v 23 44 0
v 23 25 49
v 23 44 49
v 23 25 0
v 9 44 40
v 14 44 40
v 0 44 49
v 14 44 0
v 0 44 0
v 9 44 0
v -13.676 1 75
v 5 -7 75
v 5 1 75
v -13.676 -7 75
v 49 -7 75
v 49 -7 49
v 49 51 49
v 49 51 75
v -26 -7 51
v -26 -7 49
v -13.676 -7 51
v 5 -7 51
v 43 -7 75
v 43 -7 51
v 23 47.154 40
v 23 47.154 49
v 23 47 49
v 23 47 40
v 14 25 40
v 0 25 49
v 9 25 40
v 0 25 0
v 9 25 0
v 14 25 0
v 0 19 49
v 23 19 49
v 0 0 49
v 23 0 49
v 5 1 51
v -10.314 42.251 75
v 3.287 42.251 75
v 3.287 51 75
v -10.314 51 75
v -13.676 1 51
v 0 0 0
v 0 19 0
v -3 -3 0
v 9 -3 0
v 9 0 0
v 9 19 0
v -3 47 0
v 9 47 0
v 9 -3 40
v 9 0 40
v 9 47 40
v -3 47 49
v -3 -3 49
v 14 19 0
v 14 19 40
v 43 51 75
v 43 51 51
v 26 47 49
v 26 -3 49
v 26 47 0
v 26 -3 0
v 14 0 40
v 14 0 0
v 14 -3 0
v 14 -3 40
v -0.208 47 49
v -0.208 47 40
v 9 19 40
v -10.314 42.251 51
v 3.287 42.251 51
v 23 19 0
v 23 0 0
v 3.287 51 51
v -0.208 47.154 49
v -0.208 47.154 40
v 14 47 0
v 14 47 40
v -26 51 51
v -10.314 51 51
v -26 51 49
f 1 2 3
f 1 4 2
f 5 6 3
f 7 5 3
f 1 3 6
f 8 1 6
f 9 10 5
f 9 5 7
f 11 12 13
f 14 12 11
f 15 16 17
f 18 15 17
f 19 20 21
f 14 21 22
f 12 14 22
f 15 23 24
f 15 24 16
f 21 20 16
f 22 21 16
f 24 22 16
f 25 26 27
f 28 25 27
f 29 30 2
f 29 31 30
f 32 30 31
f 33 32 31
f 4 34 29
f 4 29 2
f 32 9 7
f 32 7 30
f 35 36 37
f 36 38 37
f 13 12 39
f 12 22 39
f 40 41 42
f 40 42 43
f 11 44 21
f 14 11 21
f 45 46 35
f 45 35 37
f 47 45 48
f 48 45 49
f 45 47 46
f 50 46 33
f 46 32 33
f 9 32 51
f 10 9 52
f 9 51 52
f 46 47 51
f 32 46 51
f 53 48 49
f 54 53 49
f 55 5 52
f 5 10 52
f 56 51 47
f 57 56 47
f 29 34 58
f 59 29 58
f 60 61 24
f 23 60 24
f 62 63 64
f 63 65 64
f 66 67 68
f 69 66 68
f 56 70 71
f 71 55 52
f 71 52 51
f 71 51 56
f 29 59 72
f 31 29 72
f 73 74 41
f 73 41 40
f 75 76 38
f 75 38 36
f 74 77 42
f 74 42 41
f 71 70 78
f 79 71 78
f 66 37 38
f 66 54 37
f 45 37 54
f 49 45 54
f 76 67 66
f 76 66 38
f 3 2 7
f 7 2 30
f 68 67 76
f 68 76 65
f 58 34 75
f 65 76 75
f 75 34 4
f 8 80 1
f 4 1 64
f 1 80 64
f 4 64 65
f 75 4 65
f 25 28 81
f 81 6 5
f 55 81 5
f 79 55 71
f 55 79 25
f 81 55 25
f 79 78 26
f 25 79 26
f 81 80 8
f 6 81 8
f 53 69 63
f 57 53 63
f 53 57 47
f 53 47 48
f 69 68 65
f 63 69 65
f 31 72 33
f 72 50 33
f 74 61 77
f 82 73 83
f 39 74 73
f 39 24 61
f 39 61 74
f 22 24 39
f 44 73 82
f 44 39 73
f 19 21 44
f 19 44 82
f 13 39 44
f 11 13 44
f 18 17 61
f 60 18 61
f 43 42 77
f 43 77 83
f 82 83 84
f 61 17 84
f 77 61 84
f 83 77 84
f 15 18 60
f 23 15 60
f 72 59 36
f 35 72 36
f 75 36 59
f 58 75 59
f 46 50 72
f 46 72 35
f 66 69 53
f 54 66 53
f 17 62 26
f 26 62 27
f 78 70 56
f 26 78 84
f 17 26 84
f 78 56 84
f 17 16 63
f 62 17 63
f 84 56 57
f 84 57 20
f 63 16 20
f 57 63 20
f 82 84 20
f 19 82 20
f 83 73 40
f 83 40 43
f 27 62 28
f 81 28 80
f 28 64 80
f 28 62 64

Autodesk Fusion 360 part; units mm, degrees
sketch "Sketch1" plane through (0, 0, 0) normal (0, 0, 1) x (1, 0, 0)
  line L0 (0, 0) -> (23, 0)
  line L1 (23, 0) -> (23, 19)
  line L2 (23, 19) -> (0, 19)
  line L3 (0, 19) -> (0, 0)
  line L4 (0, 0) -> (23, 19) construction
  line L5 (14, -5.5) -> (9, -5.5) construction
  line L6 (9, -5.5) -> (9, 24.5)
  line L7 (9, 24.5) -> (14, 24.5) construction
  line L8 (14, 24.5) -> (14, -5.5)
  line L9 (14, -5.5) -> (9, 24.5) construction
  line L10 (9, -5.5) -> (14, 24.5) construction
  line L11 (-3, 22) -> (-3, -3)
  line L12 (-3, -3) -> (26, -3)
  line L13 (26, -3) -> (26, 22)
  line L14 (26, 22) -> (-3, 22)
  point P0 (11.5, 9.5)
  dimension "d1" = 23
  dimension "d2" = 19
  dimension "d5" = 5
  dimension "d6" = 3
  dimension "d11" = 30
extrude "Extrude4" add sketch "Sketch1" along normal blind 50 contours L0 L2 L3 L6 L11 L12 L14 | L0 L1 L2 L8 L12 L13 L14 makes body 1 at (-3, 13.6667, 16.6667) makes body 2 at (26, 5.3333, 16.6667)
sketch "Sketch2" plane through (0, 0, 50) normal (0, 0, 1) x (-1, 0, 0)
  line L0 (-14, 0) -> (-14, 3)
  line L1 (-14, 3) -> (-26, 3)
  line L2 (-26, 3) -> (-26, -22)
  line L3 (-26, -22) -> (-14, -22)
  line L4 (-14, -22) -> (-14, -19)
  line L5 (-14, -19) -> (-23, -19)
  line L6 (-23, -19) -> (-23, 0)
  line L7 (-23, 0) -> (-14, 0)
  line L8 (0.208, -22.1542) -> (-23, -22.1542)
  line L9 (-23, -22.1542) -> (-23, -19)
  line L10 (-23, -19) -> (0.208, -19)
  line L11 (0.208, -19) -> (0.208, -22.1542)
  line L12 (0, 0) -> (-23, 0)
  line L13 (-23, 0) -> (-23, 3)
  line L14 (-23, 3) -> (0, 3)
  line L15 (0, 3) -> (0, 0)
extrude "Extrude5" add sketch "Sketch2" against normal blind 10 contours L0 L1 L7 L12 L13 L14 | L0 L12 L14 L15 | L3 L4 L5 L9 L10 | L3 L4 L8 L9 L10 L11 bodies 1 2
copy_body "CopyPasteBodies1" bodies 1 makes body 3
move_body "Move1" bodies 3 to x (1, 0, 0) y (0, 1, 0) z (0, 0, 1) at (0, 30, 0)
move_body "Move2" bodies 3 to x (1, 0, 0) y (0, 1, 0) z (0, 0, 1) at (0, -5, 0)
sketch "Sketch3" plane through (0, 0, 50) normal (0, 0, 1) x (-1, 0, 0)
  line L0 (0, -44) -> (-23, -44)
  line L1 (-23, -44) -> (-23, -25)
  line L2 (-23, -25) -> (0, -25)
  line L3 (0, -25) -> (0, -44)
  line L4 (-23, -47) -> (-23, -47.1542)
  line L5 (-23, -47.1542) -> (0.208, -47.1542)
  line L6 (0.208, -47.1542) -> (0.208, -47)
  line L7 (0.208, -47) -> (3, -47)
  line L8 (3, -47) -> (3, -22)
  line L9 (3, -22) -> (-26, -22)
  line L10 (-26, -22) -> (-26, -47)
  line L11 (-26, -47) -> (-23, -47)
  line L12 (0, 0) -> (-23, -44) construction
  line L13 (26, 7) -> (-49, 7)
  line L14 (-49, 7) -> (-49, -51)
  line L15 (-49, -51) -> (26, -51)
  line L16 (26, -51) -> (26, 7)
  line L17 (26, 7) -> (-49, -51) construction
  line L18 (-49, 7) -> (26, -51) construction
  line L19 (-49, -51) -> (-43, -51) construction
  line L20 (-43, -51) -> (-43, 7)
  line L21 (13.676, 7) -> (-5, 7)
  line L22 (-5, 7) -> (-5, -1)
  line L23 (-5, -1) -> (13.676, -1)
  line L24 (13.676, -1) -> (13.676, 7)
  line L25 (10.3139, -51) -> (-3.2871, -51)
  line L26 (-3.2871, -51) -> (-3.2871, -42.2509)
  line L27 (-3.2871, -42.2509) -> (10.3139, -42.2509)
  line L28 (10.3139, -42.2509) -> (10.3139, -51)
  point P0 (-11.5, -22)
  point P1 (3, -46.6655)
  point P2 (4.6174, 2.0386)
  dimension "d16" = 75
  dimension "d17" = 58
  dimension "d22" = 6
  dimension "d23" = 8
extrude "Extrude6" add sketch "Sketch3" along normal blind 1 and the other way blind 1 bodies 1 3
extrude "Extrude7" add sketch "Sketch3" along normal blind 25 contours L0 L3 L5 L6 L7 L8 L26 L27 | L0 L3 L26 L27 | L5 L6 L7 L8 L15 L25 L26 L27 L28 | L13 L14 L15 L20 | L13 L21 L22 L23 L24 bodies 1
